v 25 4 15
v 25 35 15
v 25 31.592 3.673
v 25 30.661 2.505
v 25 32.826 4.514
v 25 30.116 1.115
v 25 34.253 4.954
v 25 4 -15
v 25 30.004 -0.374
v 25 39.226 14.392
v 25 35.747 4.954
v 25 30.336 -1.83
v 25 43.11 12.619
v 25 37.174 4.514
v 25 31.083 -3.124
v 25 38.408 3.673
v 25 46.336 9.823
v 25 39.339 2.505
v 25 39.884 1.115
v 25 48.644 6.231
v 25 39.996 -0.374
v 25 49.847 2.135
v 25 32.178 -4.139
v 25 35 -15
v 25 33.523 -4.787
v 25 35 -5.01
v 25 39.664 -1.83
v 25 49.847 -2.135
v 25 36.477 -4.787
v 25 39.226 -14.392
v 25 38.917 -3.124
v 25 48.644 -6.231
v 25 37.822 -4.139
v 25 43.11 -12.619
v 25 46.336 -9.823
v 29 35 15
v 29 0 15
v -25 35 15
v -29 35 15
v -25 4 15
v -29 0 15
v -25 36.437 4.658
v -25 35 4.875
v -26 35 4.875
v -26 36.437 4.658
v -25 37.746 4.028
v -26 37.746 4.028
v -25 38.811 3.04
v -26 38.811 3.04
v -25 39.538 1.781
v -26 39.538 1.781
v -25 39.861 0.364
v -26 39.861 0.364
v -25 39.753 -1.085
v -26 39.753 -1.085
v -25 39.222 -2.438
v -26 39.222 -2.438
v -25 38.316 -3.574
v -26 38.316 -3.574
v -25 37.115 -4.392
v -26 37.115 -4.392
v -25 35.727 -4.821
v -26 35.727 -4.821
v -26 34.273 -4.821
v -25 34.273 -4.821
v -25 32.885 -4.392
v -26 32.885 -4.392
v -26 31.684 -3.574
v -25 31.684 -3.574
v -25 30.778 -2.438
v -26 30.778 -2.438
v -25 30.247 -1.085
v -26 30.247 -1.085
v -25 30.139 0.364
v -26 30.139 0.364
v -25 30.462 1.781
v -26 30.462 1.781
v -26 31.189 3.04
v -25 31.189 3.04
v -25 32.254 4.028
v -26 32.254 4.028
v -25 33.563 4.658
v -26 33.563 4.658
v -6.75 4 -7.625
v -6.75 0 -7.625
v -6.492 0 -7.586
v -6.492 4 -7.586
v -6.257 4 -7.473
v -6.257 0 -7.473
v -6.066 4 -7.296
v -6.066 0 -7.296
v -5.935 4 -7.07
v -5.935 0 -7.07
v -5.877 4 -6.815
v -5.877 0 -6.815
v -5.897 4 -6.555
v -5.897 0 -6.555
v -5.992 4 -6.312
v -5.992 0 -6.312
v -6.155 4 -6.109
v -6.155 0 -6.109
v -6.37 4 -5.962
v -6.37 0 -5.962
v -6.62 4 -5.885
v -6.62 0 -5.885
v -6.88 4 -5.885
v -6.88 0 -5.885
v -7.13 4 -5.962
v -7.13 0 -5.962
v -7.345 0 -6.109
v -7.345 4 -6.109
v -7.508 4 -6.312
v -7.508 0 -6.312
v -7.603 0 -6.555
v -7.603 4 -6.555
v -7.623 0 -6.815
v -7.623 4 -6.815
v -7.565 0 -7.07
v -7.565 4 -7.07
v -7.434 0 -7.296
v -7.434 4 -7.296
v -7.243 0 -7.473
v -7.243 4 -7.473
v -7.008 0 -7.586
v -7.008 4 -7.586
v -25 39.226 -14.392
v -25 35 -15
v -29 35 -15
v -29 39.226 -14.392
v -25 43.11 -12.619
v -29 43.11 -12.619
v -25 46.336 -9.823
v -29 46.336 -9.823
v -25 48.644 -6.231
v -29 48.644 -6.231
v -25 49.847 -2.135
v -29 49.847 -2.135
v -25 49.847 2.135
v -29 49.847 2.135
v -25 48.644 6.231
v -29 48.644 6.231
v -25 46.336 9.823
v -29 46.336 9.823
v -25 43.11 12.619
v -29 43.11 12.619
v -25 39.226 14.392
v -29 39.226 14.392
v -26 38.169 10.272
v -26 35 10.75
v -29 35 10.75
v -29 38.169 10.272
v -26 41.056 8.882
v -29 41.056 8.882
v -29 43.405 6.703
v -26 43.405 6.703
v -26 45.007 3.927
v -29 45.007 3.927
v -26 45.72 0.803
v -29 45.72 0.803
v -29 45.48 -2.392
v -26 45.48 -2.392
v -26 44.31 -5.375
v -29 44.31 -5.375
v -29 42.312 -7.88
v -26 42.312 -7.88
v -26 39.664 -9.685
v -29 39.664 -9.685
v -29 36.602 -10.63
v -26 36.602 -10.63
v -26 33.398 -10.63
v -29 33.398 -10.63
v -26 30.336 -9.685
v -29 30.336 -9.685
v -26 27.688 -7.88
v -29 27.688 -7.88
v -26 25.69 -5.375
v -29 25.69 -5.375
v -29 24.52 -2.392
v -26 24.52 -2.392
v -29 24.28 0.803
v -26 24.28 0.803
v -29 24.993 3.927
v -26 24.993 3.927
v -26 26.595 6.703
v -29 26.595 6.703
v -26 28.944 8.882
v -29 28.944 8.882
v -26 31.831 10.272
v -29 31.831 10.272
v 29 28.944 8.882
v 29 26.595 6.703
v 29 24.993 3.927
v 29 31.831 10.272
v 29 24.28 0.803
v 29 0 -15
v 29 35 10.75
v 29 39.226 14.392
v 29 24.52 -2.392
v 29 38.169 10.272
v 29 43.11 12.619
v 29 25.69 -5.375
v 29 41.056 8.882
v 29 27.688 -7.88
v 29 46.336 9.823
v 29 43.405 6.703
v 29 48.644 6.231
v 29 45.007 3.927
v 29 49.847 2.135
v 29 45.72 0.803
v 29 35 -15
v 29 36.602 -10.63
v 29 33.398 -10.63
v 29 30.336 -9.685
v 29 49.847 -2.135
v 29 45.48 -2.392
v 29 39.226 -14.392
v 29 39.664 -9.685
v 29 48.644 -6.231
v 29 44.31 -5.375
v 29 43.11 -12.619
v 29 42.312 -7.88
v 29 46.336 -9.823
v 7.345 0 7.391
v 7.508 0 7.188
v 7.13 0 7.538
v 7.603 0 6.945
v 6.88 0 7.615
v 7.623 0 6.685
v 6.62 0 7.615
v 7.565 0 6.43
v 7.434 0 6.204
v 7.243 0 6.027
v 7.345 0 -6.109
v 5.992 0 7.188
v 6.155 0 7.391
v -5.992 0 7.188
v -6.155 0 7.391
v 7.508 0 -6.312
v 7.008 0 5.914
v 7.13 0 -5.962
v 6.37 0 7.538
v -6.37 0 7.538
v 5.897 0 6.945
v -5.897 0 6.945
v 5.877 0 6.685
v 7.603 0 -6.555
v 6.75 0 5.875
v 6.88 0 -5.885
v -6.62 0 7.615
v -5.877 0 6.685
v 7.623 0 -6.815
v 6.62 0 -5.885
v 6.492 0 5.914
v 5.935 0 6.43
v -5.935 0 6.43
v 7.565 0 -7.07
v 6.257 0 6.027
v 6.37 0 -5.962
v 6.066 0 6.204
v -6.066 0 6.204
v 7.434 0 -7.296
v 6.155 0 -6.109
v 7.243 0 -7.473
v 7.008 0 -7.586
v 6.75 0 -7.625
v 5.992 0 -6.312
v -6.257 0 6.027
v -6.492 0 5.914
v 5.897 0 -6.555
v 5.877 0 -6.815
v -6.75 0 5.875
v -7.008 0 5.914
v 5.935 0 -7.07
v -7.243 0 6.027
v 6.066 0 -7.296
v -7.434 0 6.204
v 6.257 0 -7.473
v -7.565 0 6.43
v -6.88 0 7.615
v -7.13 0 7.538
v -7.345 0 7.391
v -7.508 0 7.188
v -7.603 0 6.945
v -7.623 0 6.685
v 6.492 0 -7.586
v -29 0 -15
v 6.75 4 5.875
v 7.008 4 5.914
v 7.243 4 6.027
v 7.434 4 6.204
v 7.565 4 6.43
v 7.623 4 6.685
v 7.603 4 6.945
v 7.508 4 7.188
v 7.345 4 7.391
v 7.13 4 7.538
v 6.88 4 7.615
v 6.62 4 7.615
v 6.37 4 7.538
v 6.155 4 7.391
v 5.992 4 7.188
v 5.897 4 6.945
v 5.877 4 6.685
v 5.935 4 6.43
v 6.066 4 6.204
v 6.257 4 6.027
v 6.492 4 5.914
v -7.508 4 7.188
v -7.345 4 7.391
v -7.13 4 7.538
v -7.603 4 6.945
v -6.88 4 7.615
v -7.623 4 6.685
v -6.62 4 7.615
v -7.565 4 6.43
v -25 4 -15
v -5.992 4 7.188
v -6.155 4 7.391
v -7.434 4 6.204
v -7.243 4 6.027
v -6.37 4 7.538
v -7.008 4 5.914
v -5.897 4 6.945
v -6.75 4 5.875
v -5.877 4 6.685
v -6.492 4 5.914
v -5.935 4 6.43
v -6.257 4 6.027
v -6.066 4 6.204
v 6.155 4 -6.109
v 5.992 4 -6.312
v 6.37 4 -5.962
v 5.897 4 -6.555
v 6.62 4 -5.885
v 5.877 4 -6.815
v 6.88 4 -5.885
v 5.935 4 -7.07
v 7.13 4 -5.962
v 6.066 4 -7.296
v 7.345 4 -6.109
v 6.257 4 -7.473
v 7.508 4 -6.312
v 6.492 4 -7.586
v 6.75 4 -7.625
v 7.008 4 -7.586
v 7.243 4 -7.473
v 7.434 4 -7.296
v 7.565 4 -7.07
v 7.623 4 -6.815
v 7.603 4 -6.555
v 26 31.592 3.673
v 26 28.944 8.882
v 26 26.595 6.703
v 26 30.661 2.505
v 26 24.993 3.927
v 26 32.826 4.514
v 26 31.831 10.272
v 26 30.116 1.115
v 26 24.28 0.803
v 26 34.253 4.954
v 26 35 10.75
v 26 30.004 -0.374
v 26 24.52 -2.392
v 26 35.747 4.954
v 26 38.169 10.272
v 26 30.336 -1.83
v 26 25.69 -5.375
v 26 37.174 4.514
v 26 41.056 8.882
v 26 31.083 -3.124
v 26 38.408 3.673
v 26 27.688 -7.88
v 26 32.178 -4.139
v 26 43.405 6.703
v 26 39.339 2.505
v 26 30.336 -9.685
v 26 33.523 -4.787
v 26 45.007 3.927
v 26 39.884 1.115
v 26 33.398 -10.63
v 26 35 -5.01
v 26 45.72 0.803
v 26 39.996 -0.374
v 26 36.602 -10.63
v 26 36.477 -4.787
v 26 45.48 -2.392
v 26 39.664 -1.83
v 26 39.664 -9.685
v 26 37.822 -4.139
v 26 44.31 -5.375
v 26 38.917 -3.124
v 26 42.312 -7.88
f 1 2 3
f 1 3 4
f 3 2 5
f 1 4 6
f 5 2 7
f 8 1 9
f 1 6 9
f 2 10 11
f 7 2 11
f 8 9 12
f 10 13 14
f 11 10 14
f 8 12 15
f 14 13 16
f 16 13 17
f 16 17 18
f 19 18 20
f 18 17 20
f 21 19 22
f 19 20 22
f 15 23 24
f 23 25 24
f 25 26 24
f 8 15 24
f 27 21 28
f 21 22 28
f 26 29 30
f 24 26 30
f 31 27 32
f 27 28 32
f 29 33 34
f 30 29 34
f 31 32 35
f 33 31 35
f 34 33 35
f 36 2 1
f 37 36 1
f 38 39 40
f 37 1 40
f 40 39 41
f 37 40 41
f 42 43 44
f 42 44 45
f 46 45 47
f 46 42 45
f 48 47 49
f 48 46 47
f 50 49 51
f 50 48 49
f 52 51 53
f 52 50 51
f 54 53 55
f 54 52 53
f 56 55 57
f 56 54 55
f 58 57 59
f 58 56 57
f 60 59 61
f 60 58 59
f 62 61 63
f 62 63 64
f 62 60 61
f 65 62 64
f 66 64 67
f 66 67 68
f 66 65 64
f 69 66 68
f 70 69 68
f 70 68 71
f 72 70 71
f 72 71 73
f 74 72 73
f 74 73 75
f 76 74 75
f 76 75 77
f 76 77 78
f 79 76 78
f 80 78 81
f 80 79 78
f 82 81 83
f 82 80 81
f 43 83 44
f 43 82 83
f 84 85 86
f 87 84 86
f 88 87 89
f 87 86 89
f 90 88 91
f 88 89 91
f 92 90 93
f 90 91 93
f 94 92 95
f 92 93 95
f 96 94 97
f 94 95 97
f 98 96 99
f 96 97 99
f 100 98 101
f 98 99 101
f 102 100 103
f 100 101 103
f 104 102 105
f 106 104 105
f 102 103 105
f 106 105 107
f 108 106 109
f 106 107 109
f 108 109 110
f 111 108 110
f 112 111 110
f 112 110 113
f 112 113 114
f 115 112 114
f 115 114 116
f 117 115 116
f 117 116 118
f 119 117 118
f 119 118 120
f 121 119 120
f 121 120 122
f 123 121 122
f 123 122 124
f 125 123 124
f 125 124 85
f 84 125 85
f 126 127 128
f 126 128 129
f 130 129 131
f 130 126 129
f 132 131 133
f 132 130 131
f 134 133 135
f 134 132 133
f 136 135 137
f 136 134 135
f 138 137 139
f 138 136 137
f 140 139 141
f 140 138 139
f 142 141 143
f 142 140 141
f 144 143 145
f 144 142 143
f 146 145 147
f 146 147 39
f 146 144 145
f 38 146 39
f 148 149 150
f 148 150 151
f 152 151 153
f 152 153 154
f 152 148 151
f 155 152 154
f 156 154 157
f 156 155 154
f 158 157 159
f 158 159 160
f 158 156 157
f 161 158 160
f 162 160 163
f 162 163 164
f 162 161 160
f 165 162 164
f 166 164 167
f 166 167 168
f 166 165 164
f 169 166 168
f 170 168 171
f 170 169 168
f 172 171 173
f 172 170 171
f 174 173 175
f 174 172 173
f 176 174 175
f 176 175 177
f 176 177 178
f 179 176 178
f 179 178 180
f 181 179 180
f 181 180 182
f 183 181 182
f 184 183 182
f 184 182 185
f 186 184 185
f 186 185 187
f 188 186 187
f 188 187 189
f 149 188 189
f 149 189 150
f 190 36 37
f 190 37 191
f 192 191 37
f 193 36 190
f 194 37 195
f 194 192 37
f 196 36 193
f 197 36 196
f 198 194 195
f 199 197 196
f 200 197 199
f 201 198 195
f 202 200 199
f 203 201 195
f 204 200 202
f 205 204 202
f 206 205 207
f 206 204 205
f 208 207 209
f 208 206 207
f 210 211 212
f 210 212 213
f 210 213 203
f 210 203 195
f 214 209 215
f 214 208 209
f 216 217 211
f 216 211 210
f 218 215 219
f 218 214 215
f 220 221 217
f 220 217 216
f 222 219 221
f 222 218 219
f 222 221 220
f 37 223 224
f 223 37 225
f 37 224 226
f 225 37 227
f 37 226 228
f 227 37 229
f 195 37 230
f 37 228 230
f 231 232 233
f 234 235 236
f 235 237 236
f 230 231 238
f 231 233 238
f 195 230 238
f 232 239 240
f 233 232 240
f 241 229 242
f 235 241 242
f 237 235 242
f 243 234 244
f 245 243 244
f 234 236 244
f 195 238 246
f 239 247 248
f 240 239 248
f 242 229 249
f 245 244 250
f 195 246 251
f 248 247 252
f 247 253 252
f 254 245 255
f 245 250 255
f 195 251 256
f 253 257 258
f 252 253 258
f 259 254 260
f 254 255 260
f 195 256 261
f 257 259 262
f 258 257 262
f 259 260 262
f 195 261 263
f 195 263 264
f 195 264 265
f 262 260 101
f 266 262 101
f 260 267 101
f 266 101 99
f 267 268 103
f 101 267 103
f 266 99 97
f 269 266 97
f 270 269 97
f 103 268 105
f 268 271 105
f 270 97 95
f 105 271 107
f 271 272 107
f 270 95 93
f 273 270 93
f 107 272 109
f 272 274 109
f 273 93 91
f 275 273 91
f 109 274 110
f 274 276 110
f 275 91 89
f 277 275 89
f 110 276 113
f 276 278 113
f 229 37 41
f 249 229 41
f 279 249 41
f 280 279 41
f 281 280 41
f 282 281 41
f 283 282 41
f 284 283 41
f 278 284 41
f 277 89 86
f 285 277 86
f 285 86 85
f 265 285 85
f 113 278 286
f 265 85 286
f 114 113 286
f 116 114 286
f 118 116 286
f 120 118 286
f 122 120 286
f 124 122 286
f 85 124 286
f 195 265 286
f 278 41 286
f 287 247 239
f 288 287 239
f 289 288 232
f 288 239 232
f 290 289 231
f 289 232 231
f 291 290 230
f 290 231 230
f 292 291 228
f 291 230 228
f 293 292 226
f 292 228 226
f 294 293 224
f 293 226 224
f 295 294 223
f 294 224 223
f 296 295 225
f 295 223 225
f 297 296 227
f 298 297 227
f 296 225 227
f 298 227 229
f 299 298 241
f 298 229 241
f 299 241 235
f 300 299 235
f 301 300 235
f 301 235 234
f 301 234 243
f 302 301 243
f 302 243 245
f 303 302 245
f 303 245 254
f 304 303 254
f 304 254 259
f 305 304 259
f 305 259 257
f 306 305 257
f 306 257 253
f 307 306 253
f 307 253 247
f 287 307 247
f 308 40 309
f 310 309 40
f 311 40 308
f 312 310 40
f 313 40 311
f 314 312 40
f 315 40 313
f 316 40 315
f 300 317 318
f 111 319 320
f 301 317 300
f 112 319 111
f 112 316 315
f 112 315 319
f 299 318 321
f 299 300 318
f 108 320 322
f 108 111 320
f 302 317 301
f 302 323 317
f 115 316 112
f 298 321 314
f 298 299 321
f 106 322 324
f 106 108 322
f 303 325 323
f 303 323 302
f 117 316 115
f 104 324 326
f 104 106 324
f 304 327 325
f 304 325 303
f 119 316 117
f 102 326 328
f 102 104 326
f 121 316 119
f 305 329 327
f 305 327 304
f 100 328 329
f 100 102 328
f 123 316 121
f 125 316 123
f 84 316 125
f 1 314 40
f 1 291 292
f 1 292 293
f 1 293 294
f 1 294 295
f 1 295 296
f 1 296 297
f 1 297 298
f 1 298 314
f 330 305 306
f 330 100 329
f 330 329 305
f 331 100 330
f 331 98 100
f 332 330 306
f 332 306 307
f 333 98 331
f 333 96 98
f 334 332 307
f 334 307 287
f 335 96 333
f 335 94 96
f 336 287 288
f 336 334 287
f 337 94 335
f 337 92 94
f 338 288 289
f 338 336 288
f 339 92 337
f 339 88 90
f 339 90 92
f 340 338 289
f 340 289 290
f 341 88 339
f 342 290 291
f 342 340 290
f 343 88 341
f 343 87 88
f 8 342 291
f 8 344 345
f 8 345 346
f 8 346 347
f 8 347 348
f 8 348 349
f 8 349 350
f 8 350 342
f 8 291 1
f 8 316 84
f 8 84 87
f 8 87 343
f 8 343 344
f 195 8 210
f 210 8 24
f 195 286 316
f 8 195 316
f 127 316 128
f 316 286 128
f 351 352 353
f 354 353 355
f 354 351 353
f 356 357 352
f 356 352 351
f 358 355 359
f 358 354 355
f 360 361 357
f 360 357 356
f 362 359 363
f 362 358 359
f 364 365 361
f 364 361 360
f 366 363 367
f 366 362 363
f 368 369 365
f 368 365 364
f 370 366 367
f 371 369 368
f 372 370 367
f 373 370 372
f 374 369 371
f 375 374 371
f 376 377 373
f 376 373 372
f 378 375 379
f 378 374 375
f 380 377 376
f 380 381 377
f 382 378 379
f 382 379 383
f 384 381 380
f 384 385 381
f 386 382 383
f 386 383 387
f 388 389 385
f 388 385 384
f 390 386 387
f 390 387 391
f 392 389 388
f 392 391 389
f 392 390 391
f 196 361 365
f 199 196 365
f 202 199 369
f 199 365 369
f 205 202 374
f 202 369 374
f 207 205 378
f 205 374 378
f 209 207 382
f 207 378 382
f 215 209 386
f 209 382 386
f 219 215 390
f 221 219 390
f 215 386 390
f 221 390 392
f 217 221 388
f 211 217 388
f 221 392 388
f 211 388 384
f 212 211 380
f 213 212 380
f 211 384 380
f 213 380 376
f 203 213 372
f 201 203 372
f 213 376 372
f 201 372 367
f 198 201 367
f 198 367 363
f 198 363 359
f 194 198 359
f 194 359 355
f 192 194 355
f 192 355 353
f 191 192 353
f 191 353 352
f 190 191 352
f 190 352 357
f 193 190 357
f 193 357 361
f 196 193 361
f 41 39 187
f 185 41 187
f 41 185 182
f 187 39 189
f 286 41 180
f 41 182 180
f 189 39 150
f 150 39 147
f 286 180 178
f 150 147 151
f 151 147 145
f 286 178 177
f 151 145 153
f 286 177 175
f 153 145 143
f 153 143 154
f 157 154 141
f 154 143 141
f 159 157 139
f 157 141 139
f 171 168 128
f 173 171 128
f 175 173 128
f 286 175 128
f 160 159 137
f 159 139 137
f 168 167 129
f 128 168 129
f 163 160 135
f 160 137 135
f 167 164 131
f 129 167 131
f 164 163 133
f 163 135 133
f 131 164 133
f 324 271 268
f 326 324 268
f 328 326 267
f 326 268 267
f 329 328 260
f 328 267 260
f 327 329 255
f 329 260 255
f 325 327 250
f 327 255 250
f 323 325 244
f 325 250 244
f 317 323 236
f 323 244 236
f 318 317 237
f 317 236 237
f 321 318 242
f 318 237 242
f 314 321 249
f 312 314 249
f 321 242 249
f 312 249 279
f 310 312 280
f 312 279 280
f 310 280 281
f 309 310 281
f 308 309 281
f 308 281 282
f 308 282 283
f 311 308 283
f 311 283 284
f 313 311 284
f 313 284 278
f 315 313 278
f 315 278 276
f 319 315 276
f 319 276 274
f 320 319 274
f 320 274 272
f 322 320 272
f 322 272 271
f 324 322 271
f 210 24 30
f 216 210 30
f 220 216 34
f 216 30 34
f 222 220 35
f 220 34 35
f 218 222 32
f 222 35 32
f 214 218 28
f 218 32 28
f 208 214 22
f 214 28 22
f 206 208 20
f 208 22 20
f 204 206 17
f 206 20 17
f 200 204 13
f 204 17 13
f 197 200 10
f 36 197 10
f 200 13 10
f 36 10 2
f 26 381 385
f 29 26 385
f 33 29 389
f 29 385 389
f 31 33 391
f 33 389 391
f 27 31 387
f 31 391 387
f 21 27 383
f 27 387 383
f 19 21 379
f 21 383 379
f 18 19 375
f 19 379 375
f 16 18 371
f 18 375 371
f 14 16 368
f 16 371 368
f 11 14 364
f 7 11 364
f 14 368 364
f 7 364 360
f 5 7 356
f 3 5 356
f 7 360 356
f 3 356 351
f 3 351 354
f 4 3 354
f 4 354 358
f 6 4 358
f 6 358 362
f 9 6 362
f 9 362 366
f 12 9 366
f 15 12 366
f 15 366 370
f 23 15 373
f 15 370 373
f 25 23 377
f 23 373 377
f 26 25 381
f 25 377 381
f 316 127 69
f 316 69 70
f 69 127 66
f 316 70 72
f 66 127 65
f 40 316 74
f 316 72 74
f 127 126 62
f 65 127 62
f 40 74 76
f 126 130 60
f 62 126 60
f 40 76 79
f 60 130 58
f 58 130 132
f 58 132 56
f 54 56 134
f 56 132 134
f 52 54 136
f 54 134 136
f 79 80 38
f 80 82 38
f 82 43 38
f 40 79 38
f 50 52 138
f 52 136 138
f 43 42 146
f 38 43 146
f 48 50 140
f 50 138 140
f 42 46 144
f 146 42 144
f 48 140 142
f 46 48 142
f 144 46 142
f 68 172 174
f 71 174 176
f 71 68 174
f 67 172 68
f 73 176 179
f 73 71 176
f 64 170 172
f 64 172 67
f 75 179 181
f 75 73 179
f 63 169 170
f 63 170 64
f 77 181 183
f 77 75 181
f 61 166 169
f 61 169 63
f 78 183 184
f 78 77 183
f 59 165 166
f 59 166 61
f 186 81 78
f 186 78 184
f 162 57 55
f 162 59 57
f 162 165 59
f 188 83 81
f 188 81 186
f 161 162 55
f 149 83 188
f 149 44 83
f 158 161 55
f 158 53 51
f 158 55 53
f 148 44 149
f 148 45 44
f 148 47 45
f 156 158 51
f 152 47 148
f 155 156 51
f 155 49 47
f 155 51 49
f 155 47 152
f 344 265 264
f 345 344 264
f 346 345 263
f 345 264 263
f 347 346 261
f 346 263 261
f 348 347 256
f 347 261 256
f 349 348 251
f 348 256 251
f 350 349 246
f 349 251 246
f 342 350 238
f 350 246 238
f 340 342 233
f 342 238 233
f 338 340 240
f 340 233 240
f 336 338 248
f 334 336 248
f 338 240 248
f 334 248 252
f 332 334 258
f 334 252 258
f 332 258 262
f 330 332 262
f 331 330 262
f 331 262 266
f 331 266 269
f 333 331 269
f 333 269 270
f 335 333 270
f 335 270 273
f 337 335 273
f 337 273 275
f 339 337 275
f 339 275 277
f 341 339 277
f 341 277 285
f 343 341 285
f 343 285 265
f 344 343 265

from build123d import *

# Parameters (mm, degrees)
SKETCH2_W           = 50
SKETCH2_H           = 30
BOSS_EXTRUDE1_DEPTH = 4
SKETCH3_R           = 10.75
BOSS_EXTRUDE2_DEPTH = 4
SKETCH4_R           = 10.75
SKETCH4_R_2         = 6.25
BOSS_EXTRUDE3_DEPTH = 1
SKETCH5_R           = 6.25
SKETCH5_R_2         = 5.01
BOSS_EXTRUDE4_DEPTH = 1
BOSS_EXTRUDE5_START = -1
SKETCH6_R           = 6.25
SKETCH6_R_2         = 4.875
BOSS_EXTRUDE5_DEPTH = 1
SKETCH8_R           = 0.875
CUT_EXTRUDE1_DEPTH  = 10


with BuildPart() as part:
    # Sketch2 → Boss-Extrude1 (new body)
    with BuildSketch(Plane(origin=(0, 0, 0), x_dir=(1, 0, 0), z_dir=(0, 1, 0))):
        Rectangle(SKETCH2_W, SKETCH2_H)
    extrude(amount=BOSS_EXTRUDE1_DEPTH)

    # Sketch3 → Boss-Extrude2 (add)
    with BuildSketch(Plane.ZY.offset(25)):
        with BuildLine():
            Line((-15, 0), (-15, 35))
            ThreePointArc((-15, 35), (0, 50), (15, 35))
            Line((15, 35), (15, 0))
            Line((15, 0), (-15, 0))
        make_face()
        with Locations((0, 35)):
            Circle(SKETCH3_R, mode=Mode.SUBTRACT)
    boss_extrude2 = extrude(amount=BOSS_EXTRUDE2_DEPTH)

    # Mirror1: Boss-Extrude2 across plane
    add(boss_extrude2.mirror(Plane(origin=(0, 0, 0), x_dir=(0, 0, 1), z_dir=(1, 0, 0))))

    # Sketch4 → Boss-Extrude3 (add)
    with BuildSketch(Plane(origin=(-25, 0, 0), x_dir=(0, 0, -1), z_dir=(1, 0, 0))):
        with Locations((0, 35)):
            Circle(SKETCH4_R)
        with Locations((0, 35)):
            Circle(SKETCH4_R_2, mode=Mode.SUBTRACT)
    boss_extrude3 = extrude(amount=-BOSS_EXTRUDE3_DEPTH)

    # Mirror2: Boss-Extrude3 across plane
    add(boss_extrude3.mirror(Plane(origin=(0, 0, 0), x_dir=(0, 0, 1), z_dir=(1, 0, 0))))

    # Sketch5 → Boss-Extrude4 (add)
    with BuildSketch(Plane(origin=(26, 0, 0), x_dir=(0, 0, -1), z_dir=(1, 0, 0))):
        with Locations((0, 35)):
            Circle(SKETCH5_R)
        with Locations((0, 35)):
            Circle(SKETCH5_R_2, mode=Mode.SUBTRACT)
    extrude(amount=-BOSS_EXTRUDE4_DEPTH)

    # Sketch6 → Boss-Extrude5 (add)
    with BuildSketch(Plane.ZY.offset(26).offset(BOSS_EXTRUDE5_START)):
        with Locations((0, 35)):
            Circle(SKETCH6_R)
        with Locations((0, 35)):
            Circle(SKETCH6_R_2, mode=Mode.SUBTRACT)
    extrude(amount=BOSS_EXTRUDE5_DEPTH)

    # Sketch8 → Cut-Extrude1 (cut)
    with BuildSketch(Plane.XZ):
        with Locations(Location((-6.75, 6.75, 0), (0, 0, 270))):
            Circle(SKETCH8_R)
        with Locations(Location((6.75, 6.75, 0), (0, 0, 270))):
            Circle(SKETCH8_R)
        with Locations(Location((6.75, -6.75, 0), (0, 0, 270))):
            Circle(SKETCH8_R)
        with Locations(Location((-6.75, -6.75, 0), (0, 0, 270))):
            Circle(SKETCH8_R)
    extrude(amount=-CUT_EXTRUDE1_DEPTH, mode=Mode.SUBTRACT)


solid = part.part
